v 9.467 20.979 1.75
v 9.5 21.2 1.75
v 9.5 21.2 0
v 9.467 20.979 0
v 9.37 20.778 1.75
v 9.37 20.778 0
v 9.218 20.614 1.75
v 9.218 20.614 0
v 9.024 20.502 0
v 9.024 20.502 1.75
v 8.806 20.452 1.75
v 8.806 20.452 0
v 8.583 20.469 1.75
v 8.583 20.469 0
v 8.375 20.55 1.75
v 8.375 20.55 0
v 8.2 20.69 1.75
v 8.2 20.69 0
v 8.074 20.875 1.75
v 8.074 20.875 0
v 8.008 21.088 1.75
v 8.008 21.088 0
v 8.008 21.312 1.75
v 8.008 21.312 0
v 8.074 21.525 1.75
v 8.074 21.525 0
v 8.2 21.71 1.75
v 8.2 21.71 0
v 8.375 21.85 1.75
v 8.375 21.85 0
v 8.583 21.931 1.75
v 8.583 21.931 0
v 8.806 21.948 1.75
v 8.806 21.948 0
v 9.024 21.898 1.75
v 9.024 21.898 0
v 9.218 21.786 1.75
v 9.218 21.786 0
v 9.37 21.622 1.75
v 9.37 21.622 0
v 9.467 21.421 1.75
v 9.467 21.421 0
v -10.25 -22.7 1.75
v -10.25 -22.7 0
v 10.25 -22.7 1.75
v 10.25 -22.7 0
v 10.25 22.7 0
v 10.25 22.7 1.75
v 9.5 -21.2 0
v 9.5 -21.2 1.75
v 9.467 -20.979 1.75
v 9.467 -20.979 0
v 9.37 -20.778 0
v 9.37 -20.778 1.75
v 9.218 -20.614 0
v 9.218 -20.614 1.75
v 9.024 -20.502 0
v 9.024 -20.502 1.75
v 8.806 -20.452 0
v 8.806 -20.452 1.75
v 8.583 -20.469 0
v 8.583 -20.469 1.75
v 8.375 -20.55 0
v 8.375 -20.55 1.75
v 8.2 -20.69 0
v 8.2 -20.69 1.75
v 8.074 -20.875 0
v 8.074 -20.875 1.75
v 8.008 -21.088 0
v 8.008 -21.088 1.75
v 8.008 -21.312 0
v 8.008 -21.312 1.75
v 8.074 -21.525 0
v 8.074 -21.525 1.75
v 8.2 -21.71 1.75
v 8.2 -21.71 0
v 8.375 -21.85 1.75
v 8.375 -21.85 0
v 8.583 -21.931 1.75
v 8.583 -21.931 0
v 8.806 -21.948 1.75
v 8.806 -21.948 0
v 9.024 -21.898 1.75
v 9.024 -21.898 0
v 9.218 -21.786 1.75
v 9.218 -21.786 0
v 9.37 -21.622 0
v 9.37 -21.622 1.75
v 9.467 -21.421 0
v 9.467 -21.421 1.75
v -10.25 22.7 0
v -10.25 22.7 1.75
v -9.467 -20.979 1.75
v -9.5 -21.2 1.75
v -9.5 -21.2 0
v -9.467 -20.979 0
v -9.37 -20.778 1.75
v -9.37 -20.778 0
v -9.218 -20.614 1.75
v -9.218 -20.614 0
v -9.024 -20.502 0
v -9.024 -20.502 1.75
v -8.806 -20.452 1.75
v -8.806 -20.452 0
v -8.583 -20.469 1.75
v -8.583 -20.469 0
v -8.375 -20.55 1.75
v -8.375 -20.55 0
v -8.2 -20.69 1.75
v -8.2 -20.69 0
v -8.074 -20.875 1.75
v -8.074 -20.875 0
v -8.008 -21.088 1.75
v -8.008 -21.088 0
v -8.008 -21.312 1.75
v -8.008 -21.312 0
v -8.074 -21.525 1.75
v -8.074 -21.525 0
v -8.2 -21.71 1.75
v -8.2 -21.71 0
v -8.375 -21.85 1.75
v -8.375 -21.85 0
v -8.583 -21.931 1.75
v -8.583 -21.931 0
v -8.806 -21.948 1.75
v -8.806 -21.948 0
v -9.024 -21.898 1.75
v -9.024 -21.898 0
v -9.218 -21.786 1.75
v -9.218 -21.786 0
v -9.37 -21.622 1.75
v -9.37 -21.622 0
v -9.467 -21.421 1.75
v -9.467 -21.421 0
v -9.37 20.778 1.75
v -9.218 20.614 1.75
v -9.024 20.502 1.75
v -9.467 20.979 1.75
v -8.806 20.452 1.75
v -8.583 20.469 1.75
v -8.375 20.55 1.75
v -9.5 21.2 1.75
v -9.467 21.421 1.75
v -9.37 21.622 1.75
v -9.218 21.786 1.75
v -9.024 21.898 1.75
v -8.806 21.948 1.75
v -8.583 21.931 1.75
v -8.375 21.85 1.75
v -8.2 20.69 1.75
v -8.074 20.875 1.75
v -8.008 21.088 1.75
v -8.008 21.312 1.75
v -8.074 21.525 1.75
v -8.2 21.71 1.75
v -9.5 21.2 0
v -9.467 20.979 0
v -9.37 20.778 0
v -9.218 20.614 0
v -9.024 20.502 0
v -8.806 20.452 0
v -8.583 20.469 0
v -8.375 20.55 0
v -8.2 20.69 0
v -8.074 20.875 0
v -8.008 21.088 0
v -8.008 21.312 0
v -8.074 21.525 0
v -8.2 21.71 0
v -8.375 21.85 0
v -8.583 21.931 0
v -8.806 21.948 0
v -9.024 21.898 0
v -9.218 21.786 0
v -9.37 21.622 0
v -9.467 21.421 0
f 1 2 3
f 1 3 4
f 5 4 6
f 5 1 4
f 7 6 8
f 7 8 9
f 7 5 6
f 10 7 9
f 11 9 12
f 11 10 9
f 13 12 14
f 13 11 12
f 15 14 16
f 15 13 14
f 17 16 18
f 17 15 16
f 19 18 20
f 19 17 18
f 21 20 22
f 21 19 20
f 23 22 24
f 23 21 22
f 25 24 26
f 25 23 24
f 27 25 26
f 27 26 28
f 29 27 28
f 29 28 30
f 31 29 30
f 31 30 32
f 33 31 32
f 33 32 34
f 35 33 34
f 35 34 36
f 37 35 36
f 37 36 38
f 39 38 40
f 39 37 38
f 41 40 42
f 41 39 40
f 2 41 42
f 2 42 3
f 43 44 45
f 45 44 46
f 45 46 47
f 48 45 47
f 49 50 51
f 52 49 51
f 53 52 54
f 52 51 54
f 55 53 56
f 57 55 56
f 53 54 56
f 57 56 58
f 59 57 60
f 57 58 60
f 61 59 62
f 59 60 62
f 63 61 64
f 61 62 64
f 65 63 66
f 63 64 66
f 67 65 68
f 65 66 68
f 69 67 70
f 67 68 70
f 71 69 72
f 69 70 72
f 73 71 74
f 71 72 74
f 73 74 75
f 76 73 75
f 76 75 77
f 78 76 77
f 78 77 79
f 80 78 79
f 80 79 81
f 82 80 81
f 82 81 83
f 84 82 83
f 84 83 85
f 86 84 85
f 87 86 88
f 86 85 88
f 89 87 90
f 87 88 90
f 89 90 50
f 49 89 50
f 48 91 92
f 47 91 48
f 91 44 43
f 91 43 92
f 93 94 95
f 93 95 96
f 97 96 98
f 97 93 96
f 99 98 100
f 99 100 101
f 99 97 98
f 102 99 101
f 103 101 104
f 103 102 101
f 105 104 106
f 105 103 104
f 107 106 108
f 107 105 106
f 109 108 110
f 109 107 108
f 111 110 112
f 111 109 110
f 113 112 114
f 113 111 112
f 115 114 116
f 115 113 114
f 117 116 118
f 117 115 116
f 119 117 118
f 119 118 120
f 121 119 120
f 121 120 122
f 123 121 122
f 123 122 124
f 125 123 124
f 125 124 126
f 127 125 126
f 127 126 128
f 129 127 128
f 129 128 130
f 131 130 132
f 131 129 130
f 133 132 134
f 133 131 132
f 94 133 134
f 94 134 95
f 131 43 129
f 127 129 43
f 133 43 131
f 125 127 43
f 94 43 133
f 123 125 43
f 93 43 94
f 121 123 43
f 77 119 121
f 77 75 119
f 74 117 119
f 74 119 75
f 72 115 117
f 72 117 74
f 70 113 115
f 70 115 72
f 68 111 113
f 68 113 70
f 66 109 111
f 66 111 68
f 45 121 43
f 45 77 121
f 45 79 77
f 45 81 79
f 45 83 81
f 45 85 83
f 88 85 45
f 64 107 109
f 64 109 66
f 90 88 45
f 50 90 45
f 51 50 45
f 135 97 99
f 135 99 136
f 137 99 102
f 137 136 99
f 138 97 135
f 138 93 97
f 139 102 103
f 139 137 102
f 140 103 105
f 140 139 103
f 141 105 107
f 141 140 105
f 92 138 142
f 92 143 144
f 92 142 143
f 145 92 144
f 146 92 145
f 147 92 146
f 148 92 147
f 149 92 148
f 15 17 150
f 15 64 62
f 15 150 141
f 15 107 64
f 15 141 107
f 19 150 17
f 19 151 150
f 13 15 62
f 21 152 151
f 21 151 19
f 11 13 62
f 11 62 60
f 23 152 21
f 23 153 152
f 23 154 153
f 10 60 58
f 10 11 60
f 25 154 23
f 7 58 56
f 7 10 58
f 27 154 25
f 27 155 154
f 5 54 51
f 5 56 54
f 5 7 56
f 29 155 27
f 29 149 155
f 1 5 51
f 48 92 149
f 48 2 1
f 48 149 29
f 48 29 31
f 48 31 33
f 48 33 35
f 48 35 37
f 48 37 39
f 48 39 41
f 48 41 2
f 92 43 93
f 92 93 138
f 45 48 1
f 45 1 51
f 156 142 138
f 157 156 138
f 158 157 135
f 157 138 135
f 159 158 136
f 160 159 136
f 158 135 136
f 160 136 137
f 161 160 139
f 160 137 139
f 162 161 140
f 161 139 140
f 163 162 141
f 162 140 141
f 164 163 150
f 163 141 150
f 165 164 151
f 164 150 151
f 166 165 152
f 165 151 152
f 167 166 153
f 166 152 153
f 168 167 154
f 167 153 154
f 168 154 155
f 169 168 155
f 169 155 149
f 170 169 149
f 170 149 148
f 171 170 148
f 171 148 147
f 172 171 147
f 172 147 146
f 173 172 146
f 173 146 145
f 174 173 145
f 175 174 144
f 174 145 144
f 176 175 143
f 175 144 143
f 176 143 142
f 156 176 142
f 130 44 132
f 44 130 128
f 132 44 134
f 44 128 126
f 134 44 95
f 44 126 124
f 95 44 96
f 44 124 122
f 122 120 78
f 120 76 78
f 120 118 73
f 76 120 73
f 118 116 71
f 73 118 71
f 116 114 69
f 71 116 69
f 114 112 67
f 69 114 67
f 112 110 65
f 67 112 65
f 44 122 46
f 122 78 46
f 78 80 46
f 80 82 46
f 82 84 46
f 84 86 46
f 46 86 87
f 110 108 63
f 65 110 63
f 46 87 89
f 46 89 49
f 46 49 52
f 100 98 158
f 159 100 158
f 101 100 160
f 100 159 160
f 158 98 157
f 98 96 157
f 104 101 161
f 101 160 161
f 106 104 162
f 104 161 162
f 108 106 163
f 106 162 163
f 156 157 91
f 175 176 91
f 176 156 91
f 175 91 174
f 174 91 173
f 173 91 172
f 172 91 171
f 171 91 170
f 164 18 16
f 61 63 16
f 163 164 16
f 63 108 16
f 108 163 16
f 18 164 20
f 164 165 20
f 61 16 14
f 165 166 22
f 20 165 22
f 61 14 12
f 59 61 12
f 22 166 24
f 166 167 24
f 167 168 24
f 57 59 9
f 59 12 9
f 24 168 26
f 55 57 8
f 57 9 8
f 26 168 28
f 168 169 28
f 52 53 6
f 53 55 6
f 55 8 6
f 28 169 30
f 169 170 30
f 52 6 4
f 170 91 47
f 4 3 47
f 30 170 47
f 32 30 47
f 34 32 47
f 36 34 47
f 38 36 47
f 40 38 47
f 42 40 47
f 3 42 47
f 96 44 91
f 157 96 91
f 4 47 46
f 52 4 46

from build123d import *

# Parameters (mm, degrees)
SKETCH1_W               = 20.5
SKETCH1_H               = 45.4
EXTRUDE1_DEPTH          = 1.75
SKETCH2_R               = 0.75
CUT_EXTRUDE1_DEPTH      = 1.75
MIRROR2_COPY_1_SKETCH_R = 0.75
MIRROR2_COPY_1_DEPTH    = 1.75


with BuildPart() as part:
    # Sketch1 → Extrude1 (new body)
    with BuildSketch(Plane.XY):
        Rectangle(SKETCH1_W, SKETCH1_H)
    extrude(amount=EXTRUDE1_DEPTH)

    # Sketch2 → Cut-Extrude1 (cut)
    with BuildSketch(Plane.XY.offset(1.75)):
        with Locations((8.75, -21.2)):
            Circle(SKETCH2_R)
    cut_extrude1 = extrude(amount=-CUT_EXTRUDE1_DEPTH, mode=Mode.SUBTRACT)

    # Mirror1: Cut-Extrude1 across plane
    add(cut_extrude1.mirror(Plane(origin=(0, 0, 0), x_dir=(0, 0, 1), z_dir=(1, 0, 0))), mode=Mode.SUBTRACT)

    # Mirror2: Cut-Extrude1 across plane
    add(cut_extrude1.mirror(Plane.ZX), mode=Mode.SUBTRACT)

    # Mirror2 copy 1 sketch → Mirror2 copy 1 (cut)
    with BuildSketch(Plane(origin=(0, 0, 1.75), x_dir=(-1, 0, 0), z_dir=(0, 0, 1))):
        with Locations((8.75, -21.2)):
            Circle(MIRROR2_COPY_1_SKETCH_R)
    extrude(amount=-MIRROR2_COPY_1_DEPTH, mode=Mode.SUBTRACT)


solid = part.part
